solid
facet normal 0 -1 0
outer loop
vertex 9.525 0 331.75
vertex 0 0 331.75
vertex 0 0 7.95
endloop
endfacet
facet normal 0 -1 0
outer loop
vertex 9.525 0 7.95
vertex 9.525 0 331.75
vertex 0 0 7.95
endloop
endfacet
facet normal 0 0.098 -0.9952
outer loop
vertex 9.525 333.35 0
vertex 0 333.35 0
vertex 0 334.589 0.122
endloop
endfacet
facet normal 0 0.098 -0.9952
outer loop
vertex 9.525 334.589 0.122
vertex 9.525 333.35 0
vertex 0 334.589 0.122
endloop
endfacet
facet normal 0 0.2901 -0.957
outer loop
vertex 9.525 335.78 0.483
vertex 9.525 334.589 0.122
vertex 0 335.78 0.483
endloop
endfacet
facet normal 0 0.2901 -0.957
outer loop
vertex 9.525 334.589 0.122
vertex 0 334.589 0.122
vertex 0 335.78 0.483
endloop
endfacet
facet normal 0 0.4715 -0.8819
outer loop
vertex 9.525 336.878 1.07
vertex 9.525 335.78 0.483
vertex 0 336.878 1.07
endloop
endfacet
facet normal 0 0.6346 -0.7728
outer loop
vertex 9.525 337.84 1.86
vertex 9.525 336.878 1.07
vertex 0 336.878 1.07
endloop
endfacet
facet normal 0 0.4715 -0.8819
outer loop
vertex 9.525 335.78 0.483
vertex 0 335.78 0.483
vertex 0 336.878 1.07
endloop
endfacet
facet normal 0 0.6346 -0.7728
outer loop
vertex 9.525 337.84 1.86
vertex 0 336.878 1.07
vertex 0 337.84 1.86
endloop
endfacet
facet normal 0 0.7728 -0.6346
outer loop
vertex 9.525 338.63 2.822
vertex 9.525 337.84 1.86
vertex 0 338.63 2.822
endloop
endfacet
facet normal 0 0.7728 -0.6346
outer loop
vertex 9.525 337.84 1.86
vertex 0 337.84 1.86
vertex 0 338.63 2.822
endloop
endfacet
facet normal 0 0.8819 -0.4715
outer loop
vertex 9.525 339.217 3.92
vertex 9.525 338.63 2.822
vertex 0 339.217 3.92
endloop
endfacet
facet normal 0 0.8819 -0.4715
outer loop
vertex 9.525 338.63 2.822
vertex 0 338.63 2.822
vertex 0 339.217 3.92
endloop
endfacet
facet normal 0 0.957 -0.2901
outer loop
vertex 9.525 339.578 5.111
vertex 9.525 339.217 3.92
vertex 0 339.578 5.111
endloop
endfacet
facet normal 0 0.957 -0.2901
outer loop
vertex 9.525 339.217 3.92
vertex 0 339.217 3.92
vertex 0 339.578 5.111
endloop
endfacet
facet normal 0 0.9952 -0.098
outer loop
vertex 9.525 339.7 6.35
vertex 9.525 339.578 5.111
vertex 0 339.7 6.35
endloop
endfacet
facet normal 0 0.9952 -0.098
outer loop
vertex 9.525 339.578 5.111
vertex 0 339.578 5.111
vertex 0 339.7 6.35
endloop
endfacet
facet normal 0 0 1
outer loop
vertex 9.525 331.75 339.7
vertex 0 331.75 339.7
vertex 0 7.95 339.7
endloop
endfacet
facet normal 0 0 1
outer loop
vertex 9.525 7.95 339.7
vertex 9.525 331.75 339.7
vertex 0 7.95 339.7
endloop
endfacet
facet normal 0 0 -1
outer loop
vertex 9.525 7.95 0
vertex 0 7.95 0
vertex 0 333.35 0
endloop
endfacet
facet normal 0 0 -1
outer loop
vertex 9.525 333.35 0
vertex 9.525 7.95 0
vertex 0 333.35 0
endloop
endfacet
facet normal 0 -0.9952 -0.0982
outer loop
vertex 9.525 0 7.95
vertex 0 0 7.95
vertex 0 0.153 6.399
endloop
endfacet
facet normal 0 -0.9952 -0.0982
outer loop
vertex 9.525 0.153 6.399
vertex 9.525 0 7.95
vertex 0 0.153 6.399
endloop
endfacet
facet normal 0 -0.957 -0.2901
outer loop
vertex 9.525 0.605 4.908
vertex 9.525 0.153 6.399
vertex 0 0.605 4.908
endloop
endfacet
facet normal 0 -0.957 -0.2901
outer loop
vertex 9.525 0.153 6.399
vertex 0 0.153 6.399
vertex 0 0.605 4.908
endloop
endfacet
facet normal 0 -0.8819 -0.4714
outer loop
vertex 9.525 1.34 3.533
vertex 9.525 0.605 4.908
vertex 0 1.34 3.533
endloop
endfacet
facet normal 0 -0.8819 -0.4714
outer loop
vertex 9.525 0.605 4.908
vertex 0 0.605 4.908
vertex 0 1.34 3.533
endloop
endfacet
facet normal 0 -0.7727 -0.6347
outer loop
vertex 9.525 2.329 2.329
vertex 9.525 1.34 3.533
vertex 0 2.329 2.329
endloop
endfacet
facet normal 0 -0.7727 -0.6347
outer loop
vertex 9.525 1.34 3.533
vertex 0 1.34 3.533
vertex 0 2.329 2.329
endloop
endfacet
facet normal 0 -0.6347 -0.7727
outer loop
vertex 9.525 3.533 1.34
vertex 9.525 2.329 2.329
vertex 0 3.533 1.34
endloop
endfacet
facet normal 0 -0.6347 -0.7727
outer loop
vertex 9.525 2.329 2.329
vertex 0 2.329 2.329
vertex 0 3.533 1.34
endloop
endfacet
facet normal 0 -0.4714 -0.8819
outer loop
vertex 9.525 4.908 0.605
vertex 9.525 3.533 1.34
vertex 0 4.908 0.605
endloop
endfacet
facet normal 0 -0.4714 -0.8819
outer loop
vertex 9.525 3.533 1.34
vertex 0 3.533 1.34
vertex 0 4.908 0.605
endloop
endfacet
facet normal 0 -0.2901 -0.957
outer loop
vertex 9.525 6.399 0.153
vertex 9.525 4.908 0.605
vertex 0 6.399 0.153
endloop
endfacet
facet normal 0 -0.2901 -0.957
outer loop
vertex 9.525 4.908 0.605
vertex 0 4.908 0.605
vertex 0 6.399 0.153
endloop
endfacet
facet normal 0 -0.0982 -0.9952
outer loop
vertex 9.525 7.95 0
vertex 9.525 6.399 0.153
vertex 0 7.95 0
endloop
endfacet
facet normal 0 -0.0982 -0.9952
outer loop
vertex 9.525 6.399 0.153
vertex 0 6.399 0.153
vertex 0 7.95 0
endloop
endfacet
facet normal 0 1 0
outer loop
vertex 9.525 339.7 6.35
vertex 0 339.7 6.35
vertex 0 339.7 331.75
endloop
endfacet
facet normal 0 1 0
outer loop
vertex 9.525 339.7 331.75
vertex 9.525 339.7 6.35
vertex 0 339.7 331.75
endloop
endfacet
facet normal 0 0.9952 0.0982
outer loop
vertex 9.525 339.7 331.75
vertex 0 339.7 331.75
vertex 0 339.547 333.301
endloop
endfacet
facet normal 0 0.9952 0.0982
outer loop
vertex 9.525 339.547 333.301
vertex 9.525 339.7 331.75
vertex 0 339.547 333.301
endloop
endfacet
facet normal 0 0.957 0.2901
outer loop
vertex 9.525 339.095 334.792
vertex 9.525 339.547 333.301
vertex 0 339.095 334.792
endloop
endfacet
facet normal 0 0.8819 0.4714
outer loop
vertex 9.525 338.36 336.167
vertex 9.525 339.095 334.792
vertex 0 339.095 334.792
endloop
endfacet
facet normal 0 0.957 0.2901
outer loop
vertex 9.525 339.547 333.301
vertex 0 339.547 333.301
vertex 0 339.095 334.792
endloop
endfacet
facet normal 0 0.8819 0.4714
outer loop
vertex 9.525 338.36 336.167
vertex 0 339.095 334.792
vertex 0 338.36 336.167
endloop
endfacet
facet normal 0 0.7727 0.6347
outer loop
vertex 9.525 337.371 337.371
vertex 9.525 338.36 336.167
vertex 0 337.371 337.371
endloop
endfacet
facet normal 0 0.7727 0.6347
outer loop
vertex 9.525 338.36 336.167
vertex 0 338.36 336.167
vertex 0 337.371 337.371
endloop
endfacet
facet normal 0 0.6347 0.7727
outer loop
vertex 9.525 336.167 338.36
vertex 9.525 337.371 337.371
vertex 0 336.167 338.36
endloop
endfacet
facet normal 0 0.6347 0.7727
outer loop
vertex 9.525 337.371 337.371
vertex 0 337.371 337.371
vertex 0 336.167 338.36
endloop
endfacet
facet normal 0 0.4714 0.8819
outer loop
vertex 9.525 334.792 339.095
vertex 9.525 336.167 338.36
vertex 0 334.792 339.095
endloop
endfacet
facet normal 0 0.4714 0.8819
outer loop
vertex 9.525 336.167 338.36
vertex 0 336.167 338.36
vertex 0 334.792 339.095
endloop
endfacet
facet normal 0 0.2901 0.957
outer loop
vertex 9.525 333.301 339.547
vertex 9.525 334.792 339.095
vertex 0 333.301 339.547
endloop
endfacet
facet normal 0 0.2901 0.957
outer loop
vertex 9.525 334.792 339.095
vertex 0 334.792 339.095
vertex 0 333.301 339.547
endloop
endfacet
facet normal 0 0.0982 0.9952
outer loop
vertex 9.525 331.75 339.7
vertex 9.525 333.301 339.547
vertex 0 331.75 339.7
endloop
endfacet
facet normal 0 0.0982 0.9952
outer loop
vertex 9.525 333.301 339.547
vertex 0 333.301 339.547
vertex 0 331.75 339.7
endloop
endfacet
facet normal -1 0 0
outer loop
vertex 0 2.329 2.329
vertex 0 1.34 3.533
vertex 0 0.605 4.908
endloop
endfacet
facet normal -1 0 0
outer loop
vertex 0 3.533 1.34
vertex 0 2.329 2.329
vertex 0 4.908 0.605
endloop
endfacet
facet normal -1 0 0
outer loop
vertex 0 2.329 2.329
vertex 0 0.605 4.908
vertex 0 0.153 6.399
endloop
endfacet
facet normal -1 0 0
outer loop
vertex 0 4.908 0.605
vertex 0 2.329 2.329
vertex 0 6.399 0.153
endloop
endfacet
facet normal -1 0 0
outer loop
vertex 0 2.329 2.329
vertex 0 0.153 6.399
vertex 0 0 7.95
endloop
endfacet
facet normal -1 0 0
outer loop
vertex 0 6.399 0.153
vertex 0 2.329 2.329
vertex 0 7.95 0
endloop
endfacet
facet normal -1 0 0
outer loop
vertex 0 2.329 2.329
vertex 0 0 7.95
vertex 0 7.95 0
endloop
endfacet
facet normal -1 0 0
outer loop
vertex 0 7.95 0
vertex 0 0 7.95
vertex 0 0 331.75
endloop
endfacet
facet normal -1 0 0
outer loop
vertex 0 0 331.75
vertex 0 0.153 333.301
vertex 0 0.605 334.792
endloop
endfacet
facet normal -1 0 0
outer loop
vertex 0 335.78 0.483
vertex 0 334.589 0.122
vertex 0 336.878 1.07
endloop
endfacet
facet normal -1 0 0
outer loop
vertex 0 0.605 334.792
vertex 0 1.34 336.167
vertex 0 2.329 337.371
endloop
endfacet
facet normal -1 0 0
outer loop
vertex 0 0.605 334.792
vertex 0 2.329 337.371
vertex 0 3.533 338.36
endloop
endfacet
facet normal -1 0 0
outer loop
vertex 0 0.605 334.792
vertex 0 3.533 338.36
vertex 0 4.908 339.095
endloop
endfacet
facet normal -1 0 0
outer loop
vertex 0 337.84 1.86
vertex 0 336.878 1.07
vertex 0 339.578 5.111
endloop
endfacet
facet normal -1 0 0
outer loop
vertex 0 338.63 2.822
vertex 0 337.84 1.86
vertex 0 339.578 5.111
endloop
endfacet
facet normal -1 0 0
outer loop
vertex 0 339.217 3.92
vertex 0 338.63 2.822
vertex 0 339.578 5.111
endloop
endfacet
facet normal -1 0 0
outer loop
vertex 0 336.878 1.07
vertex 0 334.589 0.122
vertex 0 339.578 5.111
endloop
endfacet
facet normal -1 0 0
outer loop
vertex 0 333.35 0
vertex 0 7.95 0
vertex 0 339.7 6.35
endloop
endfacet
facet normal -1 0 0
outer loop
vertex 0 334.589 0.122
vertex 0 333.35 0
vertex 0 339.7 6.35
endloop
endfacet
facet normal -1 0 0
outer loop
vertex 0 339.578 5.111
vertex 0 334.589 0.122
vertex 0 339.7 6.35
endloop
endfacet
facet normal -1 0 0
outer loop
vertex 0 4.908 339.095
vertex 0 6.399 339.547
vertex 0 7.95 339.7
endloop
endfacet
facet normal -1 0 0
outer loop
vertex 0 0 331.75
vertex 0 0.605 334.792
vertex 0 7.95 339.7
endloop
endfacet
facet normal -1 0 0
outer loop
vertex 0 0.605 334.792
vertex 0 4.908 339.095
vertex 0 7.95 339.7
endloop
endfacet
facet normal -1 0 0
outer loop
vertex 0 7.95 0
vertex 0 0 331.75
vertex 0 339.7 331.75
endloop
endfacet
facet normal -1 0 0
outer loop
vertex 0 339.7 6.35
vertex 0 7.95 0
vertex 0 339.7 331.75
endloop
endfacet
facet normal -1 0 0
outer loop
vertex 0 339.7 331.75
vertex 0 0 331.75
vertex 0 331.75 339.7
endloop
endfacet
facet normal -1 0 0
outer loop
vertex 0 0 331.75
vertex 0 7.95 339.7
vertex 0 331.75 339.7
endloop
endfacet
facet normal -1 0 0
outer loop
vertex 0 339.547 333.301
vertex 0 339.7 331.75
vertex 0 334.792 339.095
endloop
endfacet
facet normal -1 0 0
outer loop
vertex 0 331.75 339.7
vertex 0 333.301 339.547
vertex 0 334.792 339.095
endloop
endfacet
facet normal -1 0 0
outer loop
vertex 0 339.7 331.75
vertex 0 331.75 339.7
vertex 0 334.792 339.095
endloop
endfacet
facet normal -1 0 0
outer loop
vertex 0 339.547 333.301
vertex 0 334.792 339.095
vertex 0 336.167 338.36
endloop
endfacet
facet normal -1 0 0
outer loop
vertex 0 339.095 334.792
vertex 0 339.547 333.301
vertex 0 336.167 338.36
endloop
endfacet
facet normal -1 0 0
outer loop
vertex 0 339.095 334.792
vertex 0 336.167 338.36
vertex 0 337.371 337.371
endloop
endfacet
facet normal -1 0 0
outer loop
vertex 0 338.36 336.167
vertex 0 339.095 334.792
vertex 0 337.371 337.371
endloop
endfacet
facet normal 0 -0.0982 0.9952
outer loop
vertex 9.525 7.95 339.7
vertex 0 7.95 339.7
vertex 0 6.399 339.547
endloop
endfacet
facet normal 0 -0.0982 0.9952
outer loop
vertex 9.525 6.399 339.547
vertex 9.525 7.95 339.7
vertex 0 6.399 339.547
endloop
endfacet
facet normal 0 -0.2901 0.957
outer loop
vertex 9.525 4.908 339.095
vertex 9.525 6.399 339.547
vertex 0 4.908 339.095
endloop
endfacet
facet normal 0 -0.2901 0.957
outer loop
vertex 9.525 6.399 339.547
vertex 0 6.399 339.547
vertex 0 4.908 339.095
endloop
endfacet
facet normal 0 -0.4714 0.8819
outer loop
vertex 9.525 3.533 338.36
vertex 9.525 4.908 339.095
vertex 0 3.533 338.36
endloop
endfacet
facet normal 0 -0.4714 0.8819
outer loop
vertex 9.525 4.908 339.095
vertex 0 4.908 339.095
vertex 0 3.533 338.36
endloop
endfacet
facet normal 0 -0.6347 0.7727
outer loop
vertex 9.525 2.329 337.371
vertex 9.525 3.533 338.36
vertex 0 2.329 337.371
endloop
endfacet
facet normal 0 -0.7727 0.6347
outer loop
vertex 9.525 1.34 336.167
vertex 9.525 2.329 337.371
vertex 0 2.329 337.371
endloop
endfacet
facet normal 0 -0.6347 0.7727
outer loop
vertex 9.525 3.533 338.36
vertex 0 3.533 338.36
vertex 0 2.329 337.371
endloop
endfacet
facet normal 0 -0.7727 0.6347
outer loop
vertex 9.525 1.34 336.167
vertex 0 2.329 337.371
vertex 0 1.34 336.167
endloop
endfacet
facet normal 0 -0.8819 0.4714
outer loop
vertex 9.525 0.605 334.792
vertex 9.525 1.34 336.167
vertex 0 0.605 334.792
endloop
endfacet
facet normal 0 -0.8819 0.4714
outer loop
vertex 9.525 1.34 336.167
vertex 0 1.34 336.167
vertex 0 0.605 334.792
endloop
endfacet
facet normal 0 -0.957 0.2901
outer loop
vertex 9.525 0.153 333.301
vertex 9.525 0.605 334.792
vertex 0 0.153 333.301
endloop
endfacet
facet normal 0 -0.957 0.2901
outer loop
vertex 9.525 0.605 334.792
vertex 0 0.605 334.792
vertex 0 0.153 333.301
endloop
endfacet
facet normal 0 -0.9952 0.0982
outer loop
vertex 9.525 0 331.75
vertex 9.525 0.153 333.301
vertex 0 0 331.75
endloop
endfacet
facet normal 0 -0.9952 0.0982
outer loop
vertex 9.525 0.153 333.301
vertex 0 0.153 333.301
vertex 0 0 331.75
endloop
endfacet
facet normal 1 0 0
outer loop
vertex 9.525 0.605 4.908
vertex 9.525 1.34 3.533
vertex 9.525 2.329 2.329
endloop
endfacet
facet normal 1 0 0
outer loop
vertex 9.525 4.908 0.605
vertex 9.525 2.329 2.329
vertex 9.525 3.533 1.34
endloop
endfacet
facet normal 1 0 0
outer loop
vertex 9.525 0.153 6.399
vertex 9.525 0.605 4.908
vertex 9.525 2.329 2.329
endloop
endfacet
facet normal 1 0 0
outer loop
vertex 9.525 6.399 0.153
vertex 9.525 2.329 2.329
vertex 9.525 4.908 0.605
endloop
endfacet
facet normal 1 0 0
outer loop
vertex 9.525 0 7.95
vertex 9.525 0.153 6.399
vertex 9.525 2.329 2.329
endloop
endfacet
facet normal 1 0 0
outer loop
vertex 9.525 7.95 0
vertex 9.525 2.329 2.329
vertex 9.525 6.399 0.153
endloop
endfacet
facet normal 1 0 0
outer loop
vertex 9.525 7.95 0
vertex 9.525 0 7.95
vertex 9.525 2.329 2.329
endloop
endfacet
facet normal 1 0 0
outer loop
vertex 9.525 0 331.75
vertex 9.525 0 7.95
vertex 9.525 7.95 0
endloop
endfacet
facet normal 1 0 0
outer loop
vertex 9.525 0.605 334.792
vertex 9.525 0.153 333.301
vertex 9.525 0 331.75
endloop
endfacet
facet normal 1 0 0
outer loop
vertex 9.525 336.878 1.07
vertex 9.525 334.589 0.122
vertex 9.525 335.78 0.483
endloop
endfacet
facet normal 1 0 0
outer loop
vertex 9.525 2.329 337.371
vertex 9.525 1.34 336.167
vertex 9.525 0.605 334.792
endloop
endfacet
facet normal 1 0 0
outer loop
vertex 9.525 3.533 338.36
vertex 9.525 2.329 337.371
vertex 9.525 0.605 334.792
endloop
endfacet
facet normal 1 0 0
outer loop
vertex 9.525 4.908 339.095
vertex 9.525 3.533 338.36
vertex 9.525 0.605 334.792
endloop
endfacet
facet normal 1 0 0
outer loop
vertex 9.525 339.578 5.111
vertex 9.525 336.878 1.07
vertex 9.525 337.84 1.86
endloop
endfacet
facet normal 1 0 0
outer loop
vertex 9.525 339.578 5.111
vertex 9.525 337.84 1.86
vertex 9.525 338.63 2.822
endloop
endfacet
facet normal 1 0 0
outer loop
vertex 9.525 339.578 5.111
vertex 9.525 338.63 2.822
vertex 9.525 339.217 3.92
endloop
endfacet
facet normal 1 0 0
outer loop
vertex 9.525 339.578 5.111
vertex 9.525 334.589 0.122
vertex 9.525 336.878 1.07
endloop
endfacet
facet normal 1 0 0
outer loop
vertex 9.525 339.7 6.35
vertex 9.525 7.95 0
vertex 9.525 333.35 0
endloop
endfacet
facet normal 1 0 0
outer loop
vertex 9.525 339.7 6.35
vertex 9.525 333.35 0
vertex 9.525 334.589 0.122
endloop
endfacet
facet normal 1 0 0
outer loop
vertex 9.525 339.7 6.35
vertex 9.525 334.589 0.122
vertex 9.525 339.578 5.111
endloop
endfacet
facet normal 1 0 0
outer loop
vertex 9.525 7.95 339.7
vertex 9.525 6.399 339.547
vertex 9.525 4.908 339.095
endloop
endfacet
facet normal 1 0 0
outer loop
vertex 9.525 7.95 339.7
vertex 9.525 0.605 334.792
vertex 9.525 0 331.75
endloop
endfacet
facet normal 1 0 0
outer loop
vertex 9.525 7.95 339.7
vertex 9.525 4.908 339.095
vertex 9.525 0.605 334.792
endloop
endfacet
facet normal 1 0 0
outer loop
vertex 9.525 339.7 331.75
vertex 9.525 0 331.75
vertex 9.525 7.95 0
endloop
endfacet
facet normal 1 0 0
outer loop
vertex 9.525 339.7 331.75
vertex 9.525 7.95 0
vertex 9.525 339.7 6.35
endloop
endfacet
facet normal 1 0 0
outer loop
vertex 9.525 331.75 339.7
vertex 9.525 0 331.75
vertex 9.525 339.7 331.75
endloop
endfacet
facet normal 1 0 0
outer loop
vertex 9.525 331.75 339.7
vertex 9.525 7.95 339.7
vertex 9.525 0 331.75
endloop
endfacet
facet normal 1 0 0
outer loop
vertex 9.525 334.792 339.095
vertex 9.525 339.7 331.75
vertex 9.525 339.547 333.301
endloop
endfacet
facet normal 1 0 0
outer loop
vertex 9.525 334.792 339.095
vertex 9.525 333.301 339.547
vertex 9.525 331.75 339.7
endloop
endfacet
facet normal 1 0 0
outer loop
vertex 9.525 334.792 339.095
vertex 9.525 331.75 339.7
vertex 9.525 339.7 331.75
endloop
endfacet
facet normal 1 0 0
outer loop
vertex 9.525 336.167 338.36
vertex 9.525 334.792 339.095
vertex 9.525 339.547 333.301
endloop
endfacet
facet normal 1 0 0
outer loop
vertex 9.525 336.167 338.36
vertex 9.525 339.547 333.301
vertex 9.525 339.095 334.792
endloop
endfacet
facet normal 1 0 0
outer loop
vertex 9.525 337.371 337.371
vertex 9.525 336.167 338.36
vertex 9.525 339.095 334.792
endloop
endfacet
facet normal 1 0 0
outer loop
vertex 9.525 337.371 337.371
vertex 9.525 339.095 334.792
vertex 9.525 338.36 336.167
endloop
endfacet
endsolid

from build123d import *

# Parameters (mm, degrees)
F1_DEPTH = 9.525


with BuildPart() as f1:
    # F0 (on Right) → F1 (new body)
    with BuildSketch(Plane.YZ):
        with BuildLine():
            ThreePointArc((0, 7.95), (2.328501, 2.328501), (7.95, 0))
            Line((7.95, 0), (333.35, 0))
            ThreePointArc((333.35, 0), (337.840128, 1.859872), (339.7, 6.35))
            Line((339.7, 6.35), (339.7, 331.75))
            ThreePointArc((339.7, 331.75), (337.371499, 337.371499), (331.75, 339.7))
            Line((331.75, 339.7), (7.95, 339.7))
            ThreePointArc((7.95, 339.7), (2.328501, 337.371499), (0, 331.75))
            Line((0, 331.75), (0, 7.95))
        make_face()
    extrude(amount=F1_DEPTH)


solid = f1.part
